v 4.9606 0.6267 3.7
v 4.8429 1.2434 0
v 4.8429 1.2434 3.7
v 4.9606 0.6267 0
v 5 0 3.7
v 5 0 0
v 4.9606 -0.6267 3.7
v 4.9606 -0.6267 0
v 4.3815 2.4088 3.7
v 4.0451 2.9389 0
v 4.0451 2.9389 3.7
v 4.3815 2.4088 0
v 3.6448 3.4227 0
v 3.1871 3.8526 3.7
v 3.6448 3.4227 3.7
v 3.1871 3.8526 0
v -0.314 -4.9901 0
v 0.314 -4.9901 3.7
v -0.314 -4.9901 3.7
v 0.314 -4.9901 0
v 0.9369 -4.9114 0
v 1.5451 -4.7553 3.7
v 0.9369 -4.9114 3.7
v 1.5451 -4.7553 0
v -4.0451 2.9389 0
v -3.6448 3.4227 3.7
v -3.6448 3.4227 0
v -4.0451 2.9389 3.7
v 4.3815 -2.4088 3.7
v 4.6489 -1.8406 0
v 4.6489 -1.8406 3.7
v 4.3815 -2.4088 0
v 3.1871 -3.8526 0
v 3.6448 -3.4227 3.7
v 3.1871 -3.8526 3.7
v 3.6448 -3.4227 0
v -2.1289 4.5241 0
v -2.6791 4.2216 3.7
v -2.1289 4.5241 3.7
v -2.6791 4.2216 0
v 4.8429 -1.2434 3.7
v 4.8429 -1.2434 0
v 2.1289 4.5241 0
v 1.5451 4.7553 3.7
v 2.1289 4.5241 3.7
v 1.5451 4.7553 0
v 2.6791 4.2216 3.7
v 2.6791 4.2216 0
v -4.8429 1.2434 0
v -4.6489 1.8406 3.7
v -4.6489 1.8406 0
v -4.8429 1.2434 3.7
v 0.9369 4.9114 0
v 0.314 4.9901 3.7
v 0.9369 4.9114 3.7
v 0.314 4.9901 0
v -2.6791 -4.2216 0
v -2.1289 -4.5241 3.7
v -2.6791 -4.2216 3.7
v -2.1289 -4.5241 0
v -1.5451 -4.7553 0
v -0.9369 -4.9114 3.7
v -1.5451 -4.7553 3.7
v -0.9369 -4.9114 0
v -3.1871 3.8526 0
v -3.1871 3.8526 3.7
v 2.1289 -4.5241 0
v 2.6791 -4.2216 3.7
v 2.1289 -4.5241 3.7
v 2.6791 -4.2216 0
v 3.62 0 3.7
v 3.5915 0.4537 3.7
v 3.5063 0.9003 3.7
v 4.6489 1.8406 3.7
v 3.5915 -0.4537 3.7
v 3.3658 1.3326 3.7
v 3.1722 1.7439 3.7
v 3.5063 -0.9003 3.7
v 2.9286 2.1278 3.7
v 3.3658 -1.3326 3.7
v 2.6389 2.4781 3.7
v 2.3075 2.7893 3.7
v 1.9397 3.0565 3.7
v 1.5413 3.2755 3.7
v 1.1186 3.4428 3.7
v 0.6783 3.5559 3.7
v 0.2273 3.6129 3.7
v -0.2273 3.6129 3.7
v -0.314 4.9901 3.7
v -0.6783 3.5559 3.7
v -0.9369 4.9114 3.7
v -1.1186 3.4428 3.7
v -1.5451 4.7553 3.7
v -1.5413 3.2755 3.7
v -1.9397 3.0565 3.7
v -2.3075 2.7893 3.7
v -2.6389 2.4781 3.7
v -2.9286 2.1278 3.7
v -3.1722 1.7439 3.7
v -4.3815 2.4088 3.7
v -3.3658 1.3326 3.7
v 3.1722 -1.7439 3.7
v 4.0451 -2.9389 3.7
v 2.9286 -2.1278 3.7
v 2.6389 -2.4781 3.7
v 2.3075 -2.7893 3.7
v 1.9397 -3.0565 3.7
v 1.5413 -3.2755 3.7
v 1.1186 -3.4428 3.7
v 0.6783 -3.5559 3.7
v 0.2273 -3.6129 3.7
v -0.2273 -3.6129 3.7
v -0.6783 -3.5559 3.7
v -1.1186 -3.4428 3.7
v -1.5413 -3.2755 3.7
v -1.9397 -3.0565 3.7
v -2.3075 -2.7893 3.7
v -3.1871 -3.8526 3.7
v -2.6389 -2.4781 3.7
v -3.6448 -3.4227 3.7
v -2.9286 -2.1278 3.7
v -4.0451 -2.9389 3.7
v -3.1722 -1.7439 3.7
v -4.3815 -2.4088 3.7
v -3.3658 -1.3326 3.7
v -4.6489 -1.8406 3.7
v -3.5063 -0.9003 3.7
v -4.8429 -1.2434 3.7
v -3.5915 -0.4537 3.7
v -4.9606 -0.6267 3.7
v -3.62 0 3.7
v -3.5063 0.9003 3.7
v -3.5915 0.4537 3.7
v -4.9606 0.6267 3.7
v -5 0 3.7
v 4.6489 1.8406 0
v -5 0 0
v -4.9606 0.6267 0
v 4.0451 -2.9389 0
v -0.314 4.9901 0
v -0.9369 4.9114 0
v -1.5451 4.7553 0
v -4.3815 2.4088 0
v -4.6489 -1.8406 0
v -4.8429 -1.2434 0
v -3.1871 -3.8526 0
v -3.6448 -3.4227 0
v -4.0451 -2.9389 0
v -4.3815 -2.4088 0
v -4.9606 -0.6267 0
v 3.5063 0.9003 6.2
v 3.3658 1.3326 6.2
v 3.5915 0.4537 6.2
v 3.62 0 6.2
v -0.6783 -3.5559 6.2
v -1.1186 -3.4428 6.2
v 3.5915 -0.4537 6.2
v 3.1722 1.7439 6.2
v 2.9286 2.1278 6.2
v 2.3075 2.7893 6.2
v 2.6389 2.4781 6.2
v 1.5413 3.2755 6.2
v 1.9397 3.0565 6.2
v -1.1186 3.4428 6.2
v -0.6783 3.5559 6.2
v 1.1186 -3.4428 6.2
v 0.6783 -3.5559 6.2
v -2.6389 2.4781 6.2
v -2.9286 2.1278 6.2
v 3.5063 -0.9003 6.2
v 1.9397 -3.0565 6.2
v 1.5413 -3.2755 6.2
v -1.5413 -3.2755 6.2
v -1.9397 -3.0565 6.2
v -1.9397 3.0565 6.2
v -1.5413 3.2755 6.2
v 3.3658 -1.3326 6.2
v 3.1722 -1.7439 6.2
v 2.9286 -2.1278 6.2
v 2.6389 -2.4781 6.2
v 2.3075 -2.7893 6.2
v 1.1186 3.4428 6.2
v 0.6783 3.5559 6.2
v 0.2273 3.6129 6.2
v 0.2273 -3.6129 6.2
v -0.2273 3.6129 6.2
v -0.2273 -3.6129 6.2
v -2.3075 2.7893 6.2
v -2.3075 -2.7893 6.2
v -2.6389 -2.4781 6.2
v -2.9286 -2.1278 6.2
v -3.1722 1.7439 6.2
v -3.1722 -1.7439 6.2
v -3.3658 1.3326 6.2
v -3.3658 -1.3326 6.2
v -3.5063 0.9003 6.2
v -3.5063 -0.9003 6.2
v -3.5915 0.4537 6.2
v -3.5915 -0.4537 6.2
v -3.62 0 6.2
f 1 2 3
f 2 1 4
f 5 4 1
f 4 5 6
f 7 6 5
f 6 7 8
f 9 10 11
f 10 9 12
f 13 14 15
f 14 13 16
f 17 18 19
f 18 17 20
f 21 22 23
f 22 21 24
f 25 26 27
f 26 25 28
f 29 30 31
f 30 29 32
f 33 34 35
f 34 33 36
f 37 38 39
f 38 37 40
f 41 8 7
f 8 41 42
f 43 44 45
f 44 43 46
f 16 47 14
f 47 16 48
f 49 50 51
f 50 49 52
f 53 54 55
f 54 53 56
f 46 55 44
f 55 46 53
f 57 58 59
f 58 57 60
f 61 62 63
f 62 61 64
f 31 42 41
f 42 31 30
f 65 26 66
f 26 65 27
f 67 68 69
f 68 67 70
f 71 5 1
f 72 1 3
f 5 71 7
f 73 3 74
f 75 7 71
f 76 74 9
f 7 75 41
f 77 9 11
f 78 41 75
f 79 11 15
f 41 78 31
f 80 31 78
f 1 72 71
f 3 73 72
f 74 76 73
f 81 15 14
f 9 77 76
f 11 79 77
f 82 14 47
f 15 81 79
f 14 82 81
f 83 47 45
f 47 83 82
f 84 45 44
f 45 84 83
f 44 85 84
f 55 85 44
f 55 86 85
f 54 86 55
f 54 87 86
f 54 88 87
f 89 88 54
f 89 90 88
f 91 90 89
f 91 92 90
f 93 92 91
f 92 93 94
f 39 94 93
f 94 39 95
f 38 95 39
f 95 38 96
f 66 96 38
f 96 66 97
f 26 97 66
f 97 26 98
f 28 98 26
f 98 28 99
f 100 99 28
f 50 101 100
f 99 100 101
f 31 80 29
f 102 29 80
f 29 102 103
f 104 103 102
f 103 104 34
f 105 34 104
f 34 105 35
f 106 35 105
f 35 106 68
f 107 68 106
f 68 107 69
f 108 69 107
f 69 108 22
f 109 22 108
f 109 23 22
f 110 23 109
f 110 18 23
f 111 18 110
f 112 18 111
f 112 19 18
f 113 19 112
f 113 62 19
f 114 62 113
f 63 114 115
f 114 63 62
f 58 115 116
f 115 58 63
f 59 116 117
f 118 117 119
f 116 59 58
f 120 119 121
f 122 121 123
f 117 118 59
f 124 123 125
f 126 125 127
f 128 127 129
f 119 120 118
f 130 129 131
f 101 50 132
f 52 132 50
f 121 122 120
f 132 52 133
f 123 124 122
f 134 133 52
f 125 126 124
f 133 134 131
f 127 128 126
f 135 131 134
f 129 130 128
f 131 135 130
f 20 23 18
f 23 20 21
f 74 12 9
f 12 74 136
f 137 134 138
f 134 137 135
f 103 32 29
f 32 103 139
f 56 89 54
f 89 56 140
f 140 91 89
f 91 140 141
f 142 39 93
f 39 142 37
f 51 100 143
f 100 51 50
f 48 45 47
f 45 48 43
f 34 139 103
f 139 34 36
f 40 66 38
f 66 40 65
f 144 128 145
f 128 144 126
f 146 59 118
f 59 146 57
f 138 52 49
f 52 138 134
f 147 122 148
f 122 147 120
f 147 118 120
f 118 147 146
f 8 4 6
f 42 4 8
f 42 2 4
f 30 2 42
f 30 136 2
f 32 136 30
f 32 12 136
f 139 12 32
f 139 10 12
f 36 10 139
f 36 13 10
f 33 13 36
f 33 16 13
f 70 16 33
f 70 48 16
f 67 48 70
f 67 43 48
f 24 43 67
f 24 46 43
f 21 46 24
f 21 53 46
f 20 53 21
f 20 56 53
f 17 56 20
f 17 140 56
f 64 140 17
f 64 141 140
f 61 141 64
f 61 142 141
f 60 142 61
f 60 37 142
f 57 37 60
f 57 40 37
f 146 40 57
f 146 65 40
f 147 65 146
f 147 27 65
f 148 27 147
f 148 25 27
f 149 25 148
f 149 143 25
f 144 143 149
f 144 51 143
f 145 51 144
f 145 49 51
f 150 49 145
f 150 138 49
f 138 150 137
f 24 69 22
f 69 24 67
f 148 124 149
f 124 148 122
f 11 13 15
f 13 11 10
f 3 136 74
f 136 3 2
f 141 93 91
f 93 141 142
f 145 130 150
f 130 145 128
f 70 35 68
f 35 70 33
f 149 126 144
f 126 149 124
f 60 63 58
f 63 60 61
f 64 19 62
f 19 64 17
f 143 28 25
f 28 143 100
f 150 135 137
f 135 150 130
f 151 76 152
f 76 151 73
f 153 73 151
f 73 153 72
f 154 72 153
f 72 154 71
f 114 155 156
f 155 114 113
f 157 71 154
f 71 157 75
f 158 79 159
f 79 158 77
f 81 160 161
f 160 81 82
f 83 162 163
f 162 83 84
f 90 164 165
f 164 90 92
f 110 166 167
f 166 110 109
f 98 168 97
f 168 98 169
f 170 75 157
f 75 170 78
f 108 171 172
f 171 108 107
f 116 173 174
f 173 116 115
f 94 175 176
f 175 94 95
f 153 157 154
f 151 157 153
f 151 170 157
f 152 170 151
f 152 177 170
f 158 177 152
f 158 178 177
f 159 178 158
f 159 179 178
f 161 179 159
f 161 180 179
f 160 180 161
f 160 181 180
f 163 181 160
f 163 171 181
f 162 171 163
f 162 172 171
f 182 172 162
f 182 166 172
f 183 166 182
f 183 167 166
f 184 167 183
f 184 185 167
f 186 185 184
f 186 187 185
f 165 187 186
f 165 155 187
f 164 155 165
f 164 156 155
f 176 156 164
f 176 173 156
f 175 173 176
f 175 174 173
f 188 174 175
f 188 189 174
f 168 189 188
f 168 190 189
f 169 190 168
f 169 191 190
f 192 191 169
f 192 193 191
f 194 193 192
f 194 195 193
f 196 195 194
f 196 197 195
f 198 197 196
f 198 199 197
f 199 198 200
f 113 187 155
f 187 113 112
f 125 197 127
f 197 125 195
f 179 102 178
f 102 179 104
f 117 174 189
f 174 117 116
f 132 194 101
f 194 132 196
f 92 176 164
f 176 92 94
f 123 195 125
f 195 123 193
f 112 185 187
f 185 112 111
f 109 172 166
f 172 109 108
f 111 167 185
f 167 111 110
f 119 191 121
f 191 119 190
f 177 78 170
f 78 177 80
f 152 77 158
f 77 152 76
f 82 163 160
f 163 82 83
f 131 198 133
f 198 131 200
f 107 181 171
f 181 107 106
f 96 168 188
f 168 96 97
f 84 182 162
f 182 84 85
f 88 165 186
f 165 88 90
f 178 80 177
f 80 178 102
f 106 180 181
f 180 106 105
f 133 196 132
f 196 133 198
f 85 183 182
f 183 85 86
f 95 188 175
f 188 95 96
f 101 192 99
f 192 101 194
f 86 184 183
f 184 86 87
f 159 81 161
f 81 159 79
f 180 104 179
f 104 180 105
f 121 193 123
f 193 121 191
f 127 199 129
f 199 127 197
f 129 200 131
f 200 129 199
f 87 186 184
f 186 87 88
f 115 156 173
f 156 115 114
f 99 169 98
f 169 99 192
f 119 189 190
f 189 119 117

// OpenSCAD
module cap_bottom() {
     union () {
          cylinder(r=5, h=3, $fn=50);
          cylinder(r=3.62, h=5.5, $fn=50);
     }
}

module cap_top() {
     union () {
          cylinder(r=5, h=3.7, $fn=50);
          cylinder(r=3.62, h=6.2, $fn=50);
     }
}
               
cap_top();
